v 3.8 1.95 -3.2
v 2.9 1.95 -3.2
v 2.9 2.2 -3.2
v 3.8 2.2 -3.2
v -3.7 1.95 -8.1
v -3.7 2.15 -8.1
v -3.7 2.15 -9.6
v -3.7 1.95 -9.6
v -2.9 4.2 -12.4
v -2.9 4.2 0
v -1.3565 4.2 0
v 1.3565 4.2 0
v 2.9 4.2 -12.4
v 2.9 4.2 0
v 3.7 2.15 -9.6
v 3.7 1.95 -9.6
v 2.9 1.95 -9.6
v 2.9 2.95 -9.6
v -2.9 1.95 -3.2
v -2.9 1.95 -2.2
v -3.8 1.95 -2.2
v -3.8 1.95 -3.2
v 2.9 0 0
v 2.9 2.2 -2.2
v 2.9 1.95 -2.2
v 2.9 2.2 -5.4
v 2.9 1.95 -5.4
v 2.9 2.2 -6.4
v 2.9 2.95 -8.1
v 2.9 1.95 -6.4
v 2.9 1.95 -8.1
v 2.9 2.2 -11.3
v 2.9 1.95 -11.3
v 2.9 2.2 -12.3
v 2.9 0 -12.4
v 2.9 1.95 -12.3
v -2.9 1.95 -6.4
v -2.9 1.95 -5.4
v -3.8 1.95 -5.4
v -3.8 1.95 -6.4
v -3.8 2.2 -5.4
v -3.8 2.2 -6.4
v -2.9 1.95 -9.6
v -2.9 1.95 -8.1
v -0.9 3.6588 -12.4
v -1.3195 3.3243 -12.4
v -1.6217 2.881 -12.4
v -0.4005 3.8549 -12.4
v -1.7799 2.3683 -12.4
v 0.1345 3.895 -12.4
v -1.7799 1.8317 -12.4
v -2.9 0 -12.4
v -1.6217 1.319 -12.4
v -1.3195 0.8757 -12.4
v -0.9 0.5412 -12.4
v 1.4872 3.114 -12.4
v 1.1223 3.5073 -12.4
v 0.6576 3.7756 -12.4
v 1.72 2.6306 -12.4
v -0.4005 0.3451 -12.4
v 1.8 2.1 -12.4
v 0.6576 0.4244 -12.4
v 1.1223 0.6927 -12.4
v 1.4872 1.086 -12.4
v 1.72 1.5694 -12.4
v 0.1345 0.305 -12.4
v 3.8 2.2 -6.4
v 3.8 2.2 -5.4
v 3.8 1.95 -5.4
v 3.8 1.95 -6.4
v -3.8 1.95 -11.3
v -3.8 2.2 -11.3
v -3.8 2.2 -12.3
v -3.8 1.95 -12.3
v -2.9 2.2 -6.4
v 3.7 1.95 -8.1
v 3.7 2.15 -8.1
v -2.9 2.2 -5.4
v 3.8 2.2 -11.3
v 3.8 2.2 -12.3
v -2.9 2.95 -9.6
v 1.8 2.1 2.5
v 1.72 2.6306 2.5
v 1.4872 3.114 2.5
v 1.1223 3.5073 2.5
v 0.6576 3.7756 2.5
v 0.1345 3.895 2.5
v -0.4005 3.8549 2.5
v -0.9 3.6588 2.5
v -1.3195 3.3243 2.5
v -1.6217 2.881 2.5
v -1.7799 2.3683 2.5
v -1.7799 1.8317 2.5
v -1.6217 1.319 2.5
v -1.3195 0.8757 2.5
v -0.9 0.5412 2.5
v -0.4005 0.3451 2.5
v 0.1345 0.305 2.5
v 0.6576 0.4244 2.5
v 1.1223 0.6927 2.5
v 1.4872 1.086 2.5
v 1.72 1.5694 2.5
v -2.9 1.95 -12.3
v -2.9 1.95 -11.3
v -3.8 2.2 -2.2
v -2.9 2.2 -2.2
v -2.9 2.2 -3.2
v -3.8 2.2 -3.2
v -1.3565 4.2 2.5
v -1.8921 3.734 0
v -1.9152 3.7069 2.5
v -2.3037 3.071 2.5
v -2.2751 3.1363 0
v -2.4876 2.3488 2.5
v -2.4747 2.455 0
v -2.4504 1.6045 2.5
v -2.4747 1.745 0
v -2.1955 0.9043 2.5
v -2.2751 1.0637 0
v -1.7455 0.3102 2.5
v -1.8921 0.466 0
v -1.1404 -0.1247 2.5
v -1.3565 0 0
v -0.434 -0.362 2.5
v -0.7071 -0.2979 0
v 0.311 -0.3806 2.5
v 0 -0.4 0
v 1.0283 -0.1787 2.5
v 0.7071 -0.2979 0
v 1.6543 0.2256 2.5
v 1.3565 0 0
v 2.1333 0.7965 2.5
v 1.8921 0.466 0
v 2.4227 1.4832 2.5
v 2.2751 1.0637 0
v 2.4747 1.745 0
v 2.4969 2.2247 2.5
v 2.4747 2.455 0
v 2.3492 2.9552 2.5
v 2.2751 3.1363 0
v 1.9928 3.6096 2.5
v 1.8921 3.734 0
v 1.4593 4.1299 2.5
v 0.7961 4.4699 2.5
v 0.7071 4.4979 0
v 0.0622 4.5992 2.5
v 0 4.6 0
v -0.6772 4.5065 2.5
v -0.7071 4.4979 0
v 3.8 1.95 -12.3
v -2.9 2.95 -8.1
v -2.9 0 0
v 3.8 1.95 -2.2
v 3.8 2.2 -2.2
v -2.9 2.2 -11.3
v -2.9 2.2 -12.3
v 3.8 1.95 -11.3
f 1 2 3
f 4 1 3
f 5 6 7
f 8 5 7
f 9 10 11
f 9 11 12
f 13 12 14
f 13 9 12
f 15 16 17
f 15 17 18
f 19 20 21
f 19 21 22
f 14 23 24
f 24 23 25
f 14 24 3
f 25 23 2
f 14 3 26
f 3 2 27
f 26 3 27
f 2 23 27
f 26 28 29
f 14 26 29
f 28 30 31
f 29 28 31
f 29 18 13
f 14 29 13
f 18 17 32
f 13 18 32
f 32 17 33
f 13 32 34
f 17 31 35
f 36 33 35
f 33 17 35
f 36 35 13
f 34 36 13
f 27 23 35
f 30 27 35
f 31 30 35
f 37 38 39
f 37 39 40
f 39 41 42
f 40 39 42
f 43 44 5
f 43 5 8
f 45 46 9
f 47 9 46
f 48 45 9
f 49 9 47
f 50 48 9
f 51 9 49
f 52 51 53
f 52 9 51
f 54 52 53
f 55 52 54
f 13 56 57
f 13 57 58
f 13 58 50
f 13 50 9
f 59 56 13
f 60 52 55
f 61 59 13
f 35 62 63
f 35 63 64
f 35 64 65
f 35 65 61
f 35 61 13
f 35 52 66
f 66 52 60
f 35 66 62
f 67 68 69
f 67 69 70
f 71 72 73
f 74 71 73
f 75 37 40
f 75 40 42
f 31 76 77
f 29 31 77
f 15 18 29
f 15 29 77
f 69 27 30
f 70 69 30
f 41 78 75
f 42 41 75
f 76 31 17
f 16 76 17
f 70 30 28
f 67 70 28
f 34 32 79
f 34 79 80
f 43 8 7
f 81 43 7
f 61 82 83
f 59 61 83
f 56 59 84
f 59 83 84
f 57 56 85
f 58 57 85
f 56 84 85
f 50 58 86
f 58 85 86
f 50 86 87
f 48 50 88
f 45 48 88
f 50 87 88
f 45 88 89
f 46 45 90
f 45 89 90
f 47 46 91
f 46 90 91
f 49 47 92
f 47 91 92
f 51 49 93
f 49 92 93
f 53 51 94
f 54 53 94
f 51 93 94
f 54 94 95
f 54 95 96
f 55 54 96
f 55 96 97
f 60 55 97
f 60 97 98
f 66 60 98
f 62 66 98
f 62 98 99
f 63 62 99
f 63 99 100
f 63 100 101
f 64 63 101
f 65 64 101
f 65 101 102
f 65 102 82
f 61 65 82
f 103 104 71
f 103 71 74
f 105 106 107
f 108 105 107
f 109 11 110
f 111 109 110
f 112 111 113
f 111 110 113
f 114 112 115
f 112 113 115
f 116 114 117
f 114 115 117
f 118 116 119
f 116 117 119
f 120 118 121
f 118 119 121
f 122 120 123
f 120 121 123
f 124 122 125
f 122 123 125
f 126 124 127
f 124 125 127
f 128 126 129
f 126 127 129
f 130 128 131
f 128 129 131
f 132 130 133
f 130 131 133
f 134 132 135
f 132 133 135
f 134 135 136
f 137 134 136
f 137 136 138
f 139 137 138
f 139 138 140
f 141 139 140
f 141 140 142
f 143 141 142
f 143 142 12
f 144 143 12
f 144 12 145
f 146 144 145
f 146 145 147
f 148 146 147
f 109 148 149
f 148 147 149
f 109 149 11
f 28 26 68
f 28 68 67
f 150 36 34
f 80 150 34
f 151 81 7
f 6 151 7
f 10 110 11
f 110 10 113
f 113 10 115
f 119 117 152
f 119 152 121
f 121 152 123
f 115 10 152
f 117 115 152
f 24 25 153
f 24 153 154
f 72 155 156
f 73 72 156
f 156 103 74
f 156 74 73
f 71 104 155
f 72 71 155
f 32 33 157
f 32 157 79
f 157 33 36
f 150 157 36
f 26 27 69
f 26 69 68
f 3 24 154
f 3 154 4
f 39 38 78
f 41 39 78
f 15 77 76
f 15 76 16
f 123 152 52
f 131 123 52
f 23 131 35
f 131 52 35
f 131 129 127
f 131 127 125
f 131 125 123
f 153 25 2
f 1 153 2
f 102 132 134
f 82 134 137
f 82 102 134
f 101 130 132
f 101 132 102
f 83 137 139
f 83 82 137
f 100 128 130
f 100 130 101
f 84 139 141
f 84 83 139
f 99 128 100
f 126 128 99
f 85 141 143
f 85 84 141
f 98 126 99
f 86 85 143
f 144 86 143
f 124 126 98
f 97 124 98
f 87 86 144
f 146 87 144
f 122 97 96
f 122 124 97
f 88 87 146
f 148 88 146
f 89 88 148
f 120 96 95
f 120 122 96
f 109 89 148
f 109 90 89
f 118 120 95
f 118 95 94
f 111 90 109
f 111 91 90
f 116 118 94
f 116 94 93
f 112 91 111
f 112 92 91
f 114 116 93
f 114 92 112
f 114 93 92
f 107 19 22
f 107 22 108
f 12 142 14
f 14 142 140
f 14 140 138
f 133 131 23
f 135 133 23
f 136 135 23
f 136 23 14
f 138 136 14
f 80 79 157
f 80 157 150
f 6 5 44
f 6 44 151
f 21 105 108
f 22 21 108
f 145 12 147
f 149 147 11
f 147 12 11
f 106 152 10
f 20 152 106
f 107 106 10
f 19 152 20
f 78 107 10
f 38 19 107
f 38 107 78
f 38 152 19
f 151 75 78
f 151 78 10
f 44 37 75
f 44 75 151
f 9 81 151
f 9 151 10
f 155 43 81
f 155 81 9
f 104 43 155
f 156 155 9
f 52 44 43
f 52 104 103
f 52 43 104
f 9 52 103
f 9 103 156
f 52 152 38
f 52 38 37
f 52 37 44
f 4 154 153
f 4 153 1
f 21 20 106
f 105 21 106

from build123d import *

# Parameters (mm, degrees)
SKETCH_1_W          = 5.8
SKETCH_1_H          = 12.4
EXTRUDE_1_DEPTH     = 4.2
SKETCH_2_R          = 2.5
EXTRUDE_2_DEPTH     = 2.5
SKETCH_4_W          = 1
SKETCH_4_H          = 0.25
EXTRUDE_4_DEPTH     = 0.9
SKETCH_5_R          = 1.8
CUT_EXTRUDE_1_DEPTH = 17.050233643
SKETCH_6_W          = 1.5
SKETCH_6_H          = 1
EXTRUDE_5_DEPTH     = 0.8
CUT_EXTRUDE_2_DEPTH = 1.5


with BuildPart() as part:
    # 草图1 → 凸台-拉伸1 (new body)
    with BuildSketch(Plane(origin=(0, 0, 0), x_dir=(1, 0, 0), z_dir=(0, 1, 0))):
        with Locations((0, 6.2)):
            Rectangle(SKETCH_1_W, SKETCH_1_H)
    extrude(amount=EXTRUDE_1_DEPTH)

    # 草图2 → 凸台-拉伸2 (add)
    with BuildSketch(Plane.XY):
        with Locations(Location((0, 2.1, 0), (0, 0, 122.859880379))):
            Circle(SKETCH_2_R)
    extrude(amount=EXTRUDE_2_DEPTH)

    # 草图4 → 凸台-拉伸4 (add)
    with BuildSketch(Plane(origin=(2.9, 0, 0), x_dir=(0, 0, -1), z_dir=(1, 0, 0))):
        with Locations((2.7, 2.075)):
            Rectangle(SKETCH_4_W, SKETCH_4_H)
        with Locations((5.9, 2.075)):
            Rectangle(SKETCH_4_W, SKETCH_4_H)
        with Locations((11.8, 2.075)):
            Rectangle(SKETCH_4_W, SKETCH_4_H)
    extrude_4 = extrude(amount=EXTRUDE_4_DEPTH)

    # 草图5 → 切除-拉伸1 (cut, through all)
    with BuildSketch(Plane.XY.offset(2.5)):
        with Locations((0, 2.1)):
            Circle(SKETCH_5_R)
    extrude(amount=-CUT_EXTRUDE_1_DEPTH, mode=Mode.SUBTRACT)

    # 草图6 → 凸台-拉伸5 (add)
    with BuildSketch(Plane(origin=(2.9, 0, 0), x_dir=(0, 0, -1), z_dir=(1, 0, 0))):
        with Locations((8.85, 2.45)):
            Rectangle(SKETCH_6_W, SKETCH_6_H)
    extrude_5 = extrude(amount=EXTRUDE_5_DEPTH)

    # 草图7 → 切除-拉伸2 (cut)
    with BuildSketch(Plane(origin=(0, 0, -9.6), x_dir=(-1, 0, 0), z_dir=(0, 0, -1))):
        Polygon((-3.7, 2.95), (-2.9, 2.95), (-3.7, 2.15), align=None)
    cut_extrude_2 = extrude(amount=-CUT_EXTRUDE_2_DEPTH, mode=Mode.SUBTRACT)

    # 镜向1: 凸台-拉伸4, 凸台-拉伸5, 切除-拉伸2 across plane
    add(extrude_4.mirror(Plane(origin=(0, 0, 0), x_dir=(0, 0, 1), z_dir=(1, 0, 0))))
    add(extrude_5.mirror(Plane(origin=(0, 0, 0), x_dir=(0, 0, 1), z_dir=(1, 0, 0))))
    add(cut_extrude_2.mirror(Plane(origin=(0, 0, 0), x_dir=(0, 0, 1), z_dir=(1, 0, 0))), mode=Mode.SUBTRACT)


solid = part.part
